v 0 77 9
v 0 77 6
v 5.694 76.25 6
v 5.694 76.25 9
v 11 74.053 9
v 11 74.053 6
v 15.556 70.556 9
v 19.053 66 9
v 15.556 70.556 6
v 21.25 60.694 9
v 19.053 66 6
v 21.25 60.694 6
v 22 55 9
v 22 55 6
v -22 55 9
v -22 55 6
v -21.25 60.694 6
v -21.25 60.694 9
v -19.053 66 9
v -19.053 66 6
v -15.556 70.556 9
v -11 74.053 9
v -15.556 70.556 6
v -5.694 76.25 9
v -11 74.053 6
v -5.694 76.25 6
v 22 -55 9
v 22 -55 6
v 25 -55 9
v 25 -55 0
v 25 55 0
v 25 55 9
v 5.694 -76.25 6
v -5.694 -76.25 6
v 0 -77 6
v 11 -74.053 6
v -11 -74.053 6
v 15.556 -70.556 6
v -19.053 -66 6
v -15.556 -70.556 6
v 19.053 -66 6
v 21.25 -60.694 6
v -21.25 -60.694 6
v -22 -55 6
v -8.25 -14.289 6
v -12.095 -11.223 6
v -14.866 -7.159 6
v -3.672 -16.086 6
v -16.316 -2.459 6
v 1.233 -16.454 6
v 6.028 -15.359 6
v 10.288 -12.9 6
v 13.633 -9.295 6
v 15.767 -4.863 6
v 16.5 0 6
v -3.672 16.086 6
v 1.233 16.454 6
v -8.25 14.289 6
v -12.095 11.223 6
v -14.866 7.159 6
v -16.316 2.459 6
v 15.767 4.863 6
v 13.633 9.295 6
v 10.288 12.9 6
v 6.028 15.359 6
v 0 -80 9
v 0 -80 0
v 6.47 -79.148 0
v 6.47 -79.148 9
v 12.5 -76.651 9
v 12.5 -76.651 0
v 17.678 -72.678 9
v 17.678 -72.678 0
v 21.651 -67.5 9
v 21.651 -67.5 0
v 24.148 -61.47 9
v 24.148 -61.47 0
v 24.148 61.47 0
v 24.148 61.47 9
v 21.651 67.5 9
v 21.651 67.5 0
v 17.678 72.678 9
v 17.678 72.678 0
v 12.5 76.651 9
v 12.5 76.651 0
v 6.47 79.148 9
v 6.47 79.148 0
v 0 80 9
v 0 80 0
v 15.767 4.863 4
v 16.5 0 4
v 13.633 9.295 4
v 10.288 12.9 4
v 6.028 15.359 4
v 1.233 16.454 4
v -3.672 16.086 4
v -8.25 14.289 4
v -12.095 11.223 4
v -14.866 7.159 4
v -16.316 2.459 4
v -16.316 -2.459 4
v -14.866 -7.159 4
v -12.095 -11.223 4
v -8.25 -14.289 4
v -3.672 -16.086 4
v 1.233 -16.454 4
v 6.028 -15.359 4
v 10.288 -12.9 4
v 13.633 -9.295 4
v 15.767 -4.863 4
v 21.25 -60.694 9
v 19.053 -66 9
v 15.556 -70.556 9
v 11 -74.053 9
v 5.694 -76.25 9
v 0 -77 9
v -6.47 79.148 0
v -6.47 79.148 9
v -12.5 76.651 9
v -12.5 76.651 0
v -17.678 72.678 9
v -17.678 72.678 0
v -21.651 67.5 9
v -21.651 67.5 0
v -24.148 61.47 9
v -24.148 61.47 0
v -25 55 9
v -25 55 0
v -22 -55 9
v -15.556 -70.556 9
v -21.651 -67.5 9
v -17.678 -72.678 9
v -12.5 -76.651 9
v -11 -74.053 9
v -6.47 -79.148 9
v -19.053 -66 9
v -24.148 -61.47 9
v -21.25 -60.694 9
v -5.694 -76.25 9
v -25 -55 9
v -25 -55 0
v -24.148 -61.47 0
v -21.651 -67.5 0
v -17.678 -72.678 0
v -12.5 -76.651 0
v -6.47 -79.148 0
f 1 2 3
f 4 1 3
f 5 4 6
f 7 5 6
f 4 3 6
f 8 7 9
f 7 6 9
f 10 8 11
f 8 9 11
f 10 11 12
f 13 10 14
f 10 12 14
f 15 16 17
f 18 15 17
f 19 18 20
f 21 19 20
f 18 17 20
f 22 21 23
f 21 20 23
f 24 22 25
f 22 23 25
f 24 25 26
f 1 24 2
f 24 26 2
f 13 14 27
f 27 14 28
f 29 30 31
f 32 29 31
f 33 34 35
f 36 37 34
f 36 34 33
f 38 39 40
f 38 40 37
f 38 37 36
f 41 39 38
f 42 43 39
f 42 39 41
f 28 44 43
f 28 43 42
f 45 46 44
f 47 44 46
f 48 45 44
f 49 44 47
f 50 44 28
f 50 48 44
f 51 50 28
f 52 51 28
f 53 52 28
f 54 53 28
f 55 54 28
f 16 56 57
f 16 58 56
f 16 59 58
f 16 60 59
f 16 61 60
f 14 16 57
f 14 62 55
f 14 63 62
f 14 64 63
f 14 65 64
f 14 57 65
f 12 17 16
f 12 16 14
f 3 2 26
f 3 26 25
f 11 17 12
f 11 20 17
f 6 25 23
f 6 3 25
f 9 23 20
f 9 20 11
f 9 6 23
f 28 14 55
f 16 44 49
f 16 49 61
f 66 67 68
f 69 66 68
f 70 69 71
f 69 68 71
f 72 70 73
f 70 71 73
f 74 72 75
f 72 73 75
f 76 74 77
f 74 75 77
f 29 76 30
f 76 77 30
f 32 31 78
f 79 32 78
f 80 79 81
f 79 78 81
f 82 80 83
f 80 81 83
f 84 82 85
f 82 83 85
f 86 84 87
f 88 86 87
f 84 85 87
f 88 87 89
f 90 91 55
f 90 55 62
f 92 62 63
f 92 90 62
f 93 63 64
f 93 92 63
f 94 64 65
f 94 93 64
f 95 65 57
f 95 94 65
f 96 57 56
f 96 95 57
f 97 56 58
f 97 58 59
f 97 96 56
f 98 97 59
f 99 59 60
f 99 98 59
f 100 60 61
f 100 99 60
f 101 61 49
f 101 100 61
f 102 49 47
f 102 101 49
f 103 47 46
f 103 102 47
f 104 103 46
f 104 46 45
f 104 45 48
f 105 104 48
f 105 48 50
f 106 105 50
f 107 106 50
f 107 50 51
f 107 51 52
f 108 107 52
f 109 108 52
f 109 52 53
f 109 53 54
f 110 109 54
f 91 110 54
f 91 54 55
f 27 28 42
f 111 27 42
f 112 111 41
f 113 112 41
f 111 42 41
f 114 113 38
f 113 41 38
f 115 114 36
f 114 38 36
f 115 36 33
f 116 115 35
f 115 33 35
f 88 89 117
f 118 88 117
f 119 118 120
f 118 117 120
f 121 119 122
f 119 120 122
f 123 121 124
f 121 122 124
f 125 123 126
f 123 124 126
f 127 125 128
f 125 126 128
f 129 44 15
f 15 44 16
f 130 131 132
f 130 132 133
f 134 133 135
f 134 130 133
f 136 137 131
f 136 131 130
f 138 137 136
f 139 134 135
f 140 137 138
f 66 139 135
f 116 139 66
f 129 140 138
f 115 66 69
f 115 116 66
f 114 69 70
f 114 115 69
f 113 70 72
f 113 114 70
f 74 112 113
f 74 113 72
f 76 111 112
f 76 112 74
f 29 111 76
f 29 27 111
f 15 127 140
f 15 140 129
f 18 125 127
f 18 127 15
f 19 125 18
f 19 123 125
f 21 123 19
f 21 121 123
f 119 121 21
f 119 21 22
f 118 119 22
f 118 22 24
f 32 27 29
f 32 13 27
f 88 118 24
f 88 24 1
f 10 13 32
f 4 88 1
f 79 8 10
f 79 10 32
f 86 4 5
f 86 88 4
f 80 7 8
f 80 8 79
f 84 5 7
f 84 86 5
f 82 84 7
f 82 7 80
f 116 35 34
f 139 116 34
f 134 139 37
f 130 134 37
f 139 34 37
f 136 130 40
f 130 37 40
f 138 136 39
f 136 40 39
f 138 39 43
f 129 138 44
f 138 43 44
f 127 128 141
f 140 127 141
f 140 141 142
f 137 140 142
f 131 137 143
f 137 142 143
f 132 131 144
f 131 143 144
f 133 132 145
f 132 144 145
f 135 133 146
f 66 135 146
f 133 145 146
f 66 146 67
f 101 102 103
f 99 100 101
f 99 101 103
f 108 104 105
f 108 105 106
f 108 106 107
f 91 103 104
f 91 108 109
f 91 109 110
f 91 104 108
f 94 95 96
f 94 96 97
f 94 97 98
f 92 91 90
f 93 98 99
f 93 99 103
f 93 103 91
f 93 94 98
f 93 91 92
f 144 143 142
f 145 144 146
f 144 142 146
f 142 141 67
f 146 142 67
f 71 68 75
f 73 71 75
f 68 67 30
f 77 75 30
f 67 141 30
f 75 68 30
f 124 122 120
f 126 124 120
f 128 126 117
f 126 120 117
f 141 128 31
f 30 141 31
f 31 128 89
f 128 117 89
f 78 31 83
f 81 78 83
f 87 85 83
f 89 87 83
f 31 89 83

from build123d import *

# Parameters (mm, degrees)
F0_R     = 15
F0_R_2   = 16.5
F1_DEPTH = 6
F2_DEPTH = 4
F3_DEPTH = 9


with BuildPart() as f1:
    # F0 (on Top) → F1 (new body)
    with BuildSketch(Plane.XY):
        with BuildLine():
            ThreePointArc((0, -77), (15.556349, -70.556349), (22, -55))
            Line((22, -55), (22, 55))
            ThreePointArc((22, 55), (15.556349, 70.556349), (0, 77))
            ThreePointArc((0, 77), (-15.556349, 70.556349), (-22, 55))
            Line((-22, 55), (-22, -55))
            ThreePointArc((-22, -55), (-15.556349, -70.556349), (0, -77))
        make_face()
        with Locations((0, -45)):
            Circle(F0_R, mode=Mode.SUBTRACT)
        Circle(F0_R_2, mode=Mode.SUBTRACT)
        with Locations((0, 45)):
            Circle(F0_R_2, mode=Mode.SUBTRACT)
        with Locations((0, -45)):
            Circle(F0_R)
        with Locations((0, 45)):
            Circle(F0_R_2)
    extrude(amount=F1_DEPTH)

    # F0 (on Top) → F2 (join)
    with BuildSketch(Plane.XY):
        with Locations((0, -45)):
            Circle(F0_R)
        Circle(F0_R_2)
        with Locations((0, 45)):
            Circle(F0_R_2)
    extrude(amount=F2_DEPTH)

    # F0 (on Top) → F3 (join)
    with BuildSketch(Plane.XY):
        with BuildLine():
            ThreePointArc((0, -80), (17.67767, -72.67767), (25, -55))
            Line((25, -55), (25, 55))
            ThreePointArc((25, 55), (17.67767, 72.67767), (0, 80))
            ThreePointArc((0, 80), (-17.67767, 72.67767), (-25, 55))
            Line((-25, 55), (-25, -55))
            ThreePointArc((-25, -55), (-17.67767, -72.67767), (0, -80))
        make_face()
        with BuildLine():
            Line((22, 55), (22, -55))
            ThreePointArc((22, -55), (15.556349, -70.556349), (0, -77))
            ThreePointArc((0, -77), (-15.556349, -70.556349), (-22, -55))
            Line((-22, -55), (-22, 55))
            ThreePointArc((-22, 55), (-15.556349, 70.556349), (0, 77))
            ThreePointArc((0, 77), (15.556349, 70.556349), (22, 55))
        make_face(mode=Mode.SUBTRACT)
    extrude(amount=F3_DEPTH)


solid = f1.part
